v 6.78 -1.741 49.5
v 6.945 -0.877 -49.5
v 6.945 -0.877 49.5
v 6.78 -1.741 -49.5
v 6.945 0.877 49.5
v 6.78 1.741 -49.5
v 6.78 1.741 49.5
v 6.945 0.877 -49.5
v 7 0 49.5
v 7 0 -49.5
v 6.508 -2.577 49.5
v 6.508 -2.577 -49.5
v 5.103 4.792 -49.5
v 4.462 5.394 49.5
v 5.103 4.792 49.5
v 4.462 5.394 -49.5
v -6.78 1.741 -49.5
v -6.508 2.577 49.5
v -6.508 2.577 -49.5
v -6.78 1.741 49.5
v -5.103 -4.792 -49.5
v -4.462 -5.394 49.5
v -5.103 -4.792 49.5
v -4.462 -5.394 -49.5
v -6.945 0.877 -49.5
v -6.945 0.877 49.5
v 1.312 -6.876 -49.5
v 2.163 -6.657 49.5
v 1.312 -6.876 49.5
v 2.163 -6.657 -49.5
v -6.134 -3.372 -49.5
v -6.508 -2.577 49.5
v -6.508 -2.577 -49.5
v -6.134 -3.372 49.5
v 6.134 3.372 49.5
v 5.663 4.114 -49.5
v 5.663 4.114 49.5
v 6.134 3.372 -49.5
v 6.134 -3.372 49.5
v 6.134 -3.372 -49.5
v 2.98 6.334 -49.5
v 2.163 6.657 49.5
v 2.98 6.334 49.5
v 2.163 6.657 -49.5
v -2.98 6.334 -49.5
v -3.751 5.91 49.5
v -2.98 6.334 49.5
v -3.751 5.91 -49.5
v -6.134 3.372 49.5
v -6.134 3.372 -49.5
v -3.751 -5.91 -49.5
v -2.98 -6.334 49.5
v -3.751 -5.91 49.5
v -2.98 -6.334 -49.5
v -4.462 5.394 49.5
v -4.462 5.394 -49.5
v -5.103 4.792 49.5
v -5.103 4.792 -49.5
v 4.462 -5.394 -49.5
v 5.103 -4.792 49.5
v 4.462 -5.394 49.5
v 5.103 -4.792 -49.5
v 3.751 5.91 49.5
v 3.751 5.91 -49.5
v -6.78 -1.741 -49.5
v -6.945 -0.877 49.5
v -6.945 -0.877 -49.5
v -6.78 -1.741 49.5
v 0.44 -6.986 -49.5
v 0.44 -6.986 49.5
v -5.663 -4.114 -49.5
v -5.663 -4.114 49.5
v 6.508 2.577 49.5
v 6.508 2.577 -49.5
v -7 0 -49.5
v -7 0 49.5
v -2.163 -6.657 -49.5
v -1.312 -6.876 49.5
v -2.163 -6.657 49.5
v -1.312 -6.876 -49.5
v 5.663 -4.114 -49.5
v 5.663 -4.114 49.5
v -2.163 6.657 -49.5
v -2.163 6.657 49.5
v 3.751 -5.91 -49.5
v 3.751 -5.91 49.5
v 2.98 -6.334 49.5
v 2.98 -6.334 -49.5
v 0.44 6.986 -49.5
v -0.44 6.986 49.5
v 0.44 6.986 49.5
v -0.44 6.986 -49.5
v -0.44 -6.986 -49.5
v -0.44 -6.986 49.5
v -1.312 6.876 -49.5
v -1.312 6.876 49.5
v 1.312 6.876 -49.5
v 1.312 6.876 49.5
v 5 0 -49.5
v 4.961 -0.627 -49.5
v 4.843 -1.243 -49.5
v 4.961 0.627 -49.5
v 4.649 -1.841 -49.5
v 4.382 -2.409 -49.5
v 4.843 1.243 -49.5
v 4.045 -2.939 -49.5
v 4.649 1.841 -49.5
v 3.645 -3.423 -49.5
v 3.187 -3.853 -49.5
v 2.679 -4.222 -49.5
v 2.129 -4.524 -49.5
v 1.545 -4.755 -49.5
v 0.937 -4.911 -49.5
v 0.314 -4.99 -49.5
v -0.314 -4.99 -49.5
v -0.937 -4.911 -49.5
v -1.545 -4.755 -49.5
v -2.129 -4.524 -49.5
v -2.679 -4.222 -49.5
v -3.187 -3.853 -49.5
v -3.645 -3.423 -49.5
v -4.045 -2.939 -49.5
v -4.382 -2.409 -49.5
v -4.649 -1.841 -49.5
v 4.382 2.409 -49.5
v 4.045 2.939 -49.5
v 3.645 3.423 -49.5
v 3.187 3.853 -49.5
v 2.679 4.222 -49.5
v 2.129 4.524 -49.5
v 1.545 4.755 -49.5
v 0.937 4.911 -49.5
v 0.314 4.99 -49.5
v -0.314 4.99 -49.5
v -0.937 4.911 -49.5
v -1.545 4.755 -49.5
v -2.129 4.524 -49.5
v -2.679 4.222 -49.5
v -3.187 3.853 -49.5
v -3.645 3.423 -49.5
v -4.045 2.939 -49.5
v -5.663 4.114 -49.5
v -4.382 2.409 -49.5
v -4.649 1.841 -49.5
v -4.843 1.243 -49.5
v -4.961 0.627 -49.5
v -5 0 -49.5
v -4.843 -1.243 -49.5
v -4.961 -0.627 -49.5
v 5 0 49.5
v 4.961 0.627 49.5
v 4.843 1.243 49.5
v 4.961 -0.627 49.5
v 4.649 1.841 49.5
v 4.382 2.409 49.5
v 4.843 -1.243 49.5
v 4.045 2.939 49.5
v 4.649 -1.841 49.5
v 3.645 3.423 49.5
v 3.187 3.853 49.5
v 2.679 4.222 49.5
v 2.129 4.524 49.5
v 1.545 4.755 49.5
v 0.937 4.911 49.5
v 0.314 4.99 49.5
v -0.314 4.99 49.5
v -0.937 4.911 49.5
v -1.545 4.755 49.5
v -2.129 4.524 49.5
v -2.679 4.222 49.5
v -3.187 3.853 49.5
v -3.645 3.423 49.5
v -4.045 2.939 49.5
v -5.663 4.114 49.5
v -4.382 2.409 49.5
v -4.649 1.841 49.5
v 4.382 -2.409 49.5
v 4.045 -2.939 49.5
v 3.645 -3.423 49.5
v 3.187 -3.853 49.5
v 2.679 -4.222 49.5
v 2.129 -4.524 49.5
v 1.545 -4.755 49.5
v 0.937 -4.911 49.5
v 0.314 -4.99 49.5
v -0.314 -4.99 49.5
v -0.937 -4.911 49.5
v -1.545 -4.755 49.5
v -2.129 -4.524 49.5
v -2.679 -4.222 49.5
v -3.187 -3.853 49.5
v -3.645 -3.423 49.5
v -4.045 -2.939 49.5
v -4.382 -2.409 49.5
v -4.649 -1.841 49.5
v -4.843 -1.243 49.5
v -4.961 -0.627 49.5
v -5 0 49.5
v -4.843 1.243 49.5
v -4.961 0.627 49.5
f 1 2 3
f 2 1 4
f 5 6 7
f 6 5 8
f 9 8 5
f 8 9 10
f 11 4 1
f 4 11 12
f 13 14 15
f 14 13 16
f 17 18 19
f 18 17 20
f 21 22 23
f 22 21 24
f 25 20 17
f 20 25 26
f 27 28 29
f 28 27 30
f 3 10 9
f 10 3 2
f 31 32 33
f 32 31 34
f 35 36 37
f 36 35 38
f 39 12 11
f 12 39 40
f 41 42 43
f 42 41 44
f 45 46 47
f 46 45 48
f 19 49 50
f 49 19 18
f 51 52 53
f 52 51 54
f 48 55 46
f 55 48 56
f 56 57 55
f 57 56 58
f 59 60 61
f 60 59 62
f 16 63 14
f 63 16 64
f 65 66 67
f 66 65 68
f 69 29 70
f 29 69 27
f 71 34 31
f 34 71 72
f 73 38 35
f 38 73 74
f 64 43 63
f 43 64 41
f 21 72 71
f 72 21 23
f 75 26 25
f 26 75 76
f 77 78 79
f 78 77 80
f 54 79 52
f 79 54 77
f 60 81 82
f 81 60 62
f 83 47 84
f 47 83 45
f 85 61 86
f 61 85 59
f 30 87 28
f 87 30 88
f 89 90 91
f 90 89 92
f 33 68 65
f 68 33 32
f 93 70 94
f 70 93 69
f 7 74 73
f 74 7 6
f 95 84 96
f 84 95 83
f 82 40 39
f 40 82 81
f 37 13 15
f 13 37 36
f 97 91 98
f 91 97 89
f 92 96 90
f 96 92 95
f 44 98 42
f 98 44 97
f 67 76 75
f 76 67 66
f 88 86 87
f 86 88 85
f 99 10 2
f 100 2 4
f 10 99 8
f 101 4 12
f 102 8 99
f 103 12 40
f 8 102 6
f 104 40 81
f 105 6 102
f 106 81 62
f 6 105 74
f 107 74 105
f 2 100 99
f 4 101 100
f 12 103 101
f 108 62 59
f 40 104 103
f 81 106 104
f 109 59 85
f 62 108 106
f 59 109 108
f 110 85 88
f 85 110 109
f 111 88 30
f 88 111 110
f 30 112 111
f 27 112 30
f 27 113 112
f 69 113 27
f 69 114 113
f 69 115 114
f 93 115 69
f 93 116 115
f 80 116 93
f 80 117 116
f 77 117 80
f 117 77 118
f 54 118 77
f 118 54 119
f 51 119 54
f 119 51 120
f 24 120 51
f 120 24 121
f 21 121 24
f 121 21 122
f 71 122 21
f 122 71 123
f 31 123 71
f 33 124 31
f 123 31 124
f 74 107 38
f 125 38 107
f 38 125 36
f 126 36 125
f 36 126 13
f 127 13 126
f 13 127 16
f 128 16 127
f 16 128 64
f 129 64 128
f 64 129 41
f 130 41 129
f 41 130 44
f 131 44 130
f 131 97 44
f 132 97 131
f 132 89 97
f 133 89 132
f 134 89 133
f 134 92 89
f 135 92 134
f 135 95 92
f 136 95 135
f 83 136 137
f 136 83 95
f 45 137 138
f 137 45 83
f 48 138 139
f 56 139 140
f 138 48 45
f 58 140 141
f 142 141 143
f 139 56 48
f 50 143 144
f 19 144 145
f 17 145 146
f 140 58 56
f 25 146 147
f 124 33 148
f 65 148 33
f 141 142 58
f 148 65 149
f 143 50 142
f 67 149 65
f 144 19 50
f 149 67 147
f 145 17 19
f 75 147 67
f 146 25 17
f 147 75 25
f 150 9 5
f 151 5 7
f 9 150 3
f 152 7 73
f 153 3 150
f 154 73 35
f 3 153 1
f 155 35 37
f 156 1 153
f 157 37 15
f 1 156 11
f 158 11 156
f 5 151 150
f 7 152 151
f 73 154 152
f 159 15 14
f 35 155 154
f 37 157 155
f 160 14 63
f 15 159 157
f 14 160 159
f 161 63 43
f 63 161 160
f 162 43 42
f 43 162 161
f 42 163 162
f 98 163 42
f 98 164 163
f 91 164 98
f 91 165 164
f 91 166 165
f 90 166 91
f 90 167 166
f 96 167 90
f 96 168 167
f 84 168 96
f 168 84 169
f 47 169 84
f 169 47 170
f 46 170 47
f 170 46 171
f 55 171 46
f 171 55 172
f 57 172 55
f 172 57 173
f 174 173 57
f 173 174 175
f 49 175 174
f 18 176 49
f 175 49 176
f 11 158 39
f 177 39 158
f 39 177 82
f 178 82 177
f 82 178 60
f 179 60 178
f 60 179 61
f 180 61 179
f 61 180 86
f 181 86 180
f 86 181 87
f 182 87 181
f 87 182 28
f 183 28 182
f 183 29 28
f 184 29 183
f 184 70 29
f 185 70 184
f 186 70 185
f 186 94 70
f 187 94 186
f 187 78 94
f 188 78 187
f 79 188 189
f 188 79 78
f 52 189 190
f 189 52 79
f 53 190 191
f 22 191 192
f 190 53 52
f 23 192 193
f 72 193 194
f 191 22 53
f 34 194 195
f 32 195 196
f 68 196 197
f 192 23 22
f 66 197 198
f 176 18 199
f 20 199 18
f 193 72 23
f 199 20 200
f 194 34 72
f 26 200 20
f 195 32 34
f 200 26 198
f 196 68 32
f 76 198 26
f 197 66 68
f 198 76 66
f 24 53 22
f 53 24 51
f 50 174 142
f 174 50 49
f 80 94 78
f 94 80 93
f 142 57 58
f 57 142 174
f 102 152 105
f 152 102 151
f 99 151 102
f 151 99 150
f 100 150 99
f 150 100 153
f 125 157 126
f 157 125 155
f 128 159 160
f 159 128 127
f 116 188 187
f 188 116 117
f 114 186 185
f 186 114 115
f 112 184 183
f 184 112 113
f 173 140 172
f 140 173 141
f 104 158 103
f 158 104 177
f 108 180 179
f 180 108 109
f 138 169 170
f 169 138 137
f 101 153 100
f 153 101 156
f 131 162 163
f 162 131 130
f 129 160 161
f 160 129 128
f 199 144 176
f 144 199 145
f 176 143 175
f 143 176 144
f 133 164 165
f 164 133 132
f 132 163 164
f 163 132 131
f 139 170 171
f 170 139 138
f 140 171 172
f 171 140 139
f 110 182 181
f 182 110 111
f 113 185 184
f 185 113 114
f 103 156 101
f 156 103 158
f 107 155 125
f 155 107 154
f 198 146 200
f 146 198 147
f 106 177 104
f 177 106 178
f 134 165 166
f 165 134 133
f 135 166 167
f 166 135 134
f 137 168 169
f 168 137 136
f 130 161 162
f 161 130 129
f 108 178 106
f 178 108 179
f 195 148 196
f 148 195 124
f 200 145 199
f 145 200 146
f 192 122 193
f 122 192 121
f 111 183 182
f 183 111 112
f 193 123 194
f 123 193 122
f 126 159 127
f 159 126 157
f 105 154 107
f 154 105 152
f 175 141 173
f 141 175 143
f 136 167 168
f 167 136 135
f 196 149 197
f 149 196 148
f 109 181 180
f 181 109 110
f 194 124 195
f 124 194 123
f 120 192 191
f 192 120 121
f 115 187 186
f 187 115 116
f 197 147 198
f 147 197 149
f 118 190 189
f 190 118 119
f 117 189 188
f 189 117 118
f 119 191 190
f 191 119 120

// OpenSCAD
$fn = 50;


difference() {
	union() {
		translate(v = [0, 0, -49.5000000000]) {
			cylinder(h = 99, r = 7.0000000000);
		}
	}
	union() {
		translate(v = [0, 0, -100.0000000000]) {
			cylinder(h = 200, r = 5.0000000000);
		}
	}
}
